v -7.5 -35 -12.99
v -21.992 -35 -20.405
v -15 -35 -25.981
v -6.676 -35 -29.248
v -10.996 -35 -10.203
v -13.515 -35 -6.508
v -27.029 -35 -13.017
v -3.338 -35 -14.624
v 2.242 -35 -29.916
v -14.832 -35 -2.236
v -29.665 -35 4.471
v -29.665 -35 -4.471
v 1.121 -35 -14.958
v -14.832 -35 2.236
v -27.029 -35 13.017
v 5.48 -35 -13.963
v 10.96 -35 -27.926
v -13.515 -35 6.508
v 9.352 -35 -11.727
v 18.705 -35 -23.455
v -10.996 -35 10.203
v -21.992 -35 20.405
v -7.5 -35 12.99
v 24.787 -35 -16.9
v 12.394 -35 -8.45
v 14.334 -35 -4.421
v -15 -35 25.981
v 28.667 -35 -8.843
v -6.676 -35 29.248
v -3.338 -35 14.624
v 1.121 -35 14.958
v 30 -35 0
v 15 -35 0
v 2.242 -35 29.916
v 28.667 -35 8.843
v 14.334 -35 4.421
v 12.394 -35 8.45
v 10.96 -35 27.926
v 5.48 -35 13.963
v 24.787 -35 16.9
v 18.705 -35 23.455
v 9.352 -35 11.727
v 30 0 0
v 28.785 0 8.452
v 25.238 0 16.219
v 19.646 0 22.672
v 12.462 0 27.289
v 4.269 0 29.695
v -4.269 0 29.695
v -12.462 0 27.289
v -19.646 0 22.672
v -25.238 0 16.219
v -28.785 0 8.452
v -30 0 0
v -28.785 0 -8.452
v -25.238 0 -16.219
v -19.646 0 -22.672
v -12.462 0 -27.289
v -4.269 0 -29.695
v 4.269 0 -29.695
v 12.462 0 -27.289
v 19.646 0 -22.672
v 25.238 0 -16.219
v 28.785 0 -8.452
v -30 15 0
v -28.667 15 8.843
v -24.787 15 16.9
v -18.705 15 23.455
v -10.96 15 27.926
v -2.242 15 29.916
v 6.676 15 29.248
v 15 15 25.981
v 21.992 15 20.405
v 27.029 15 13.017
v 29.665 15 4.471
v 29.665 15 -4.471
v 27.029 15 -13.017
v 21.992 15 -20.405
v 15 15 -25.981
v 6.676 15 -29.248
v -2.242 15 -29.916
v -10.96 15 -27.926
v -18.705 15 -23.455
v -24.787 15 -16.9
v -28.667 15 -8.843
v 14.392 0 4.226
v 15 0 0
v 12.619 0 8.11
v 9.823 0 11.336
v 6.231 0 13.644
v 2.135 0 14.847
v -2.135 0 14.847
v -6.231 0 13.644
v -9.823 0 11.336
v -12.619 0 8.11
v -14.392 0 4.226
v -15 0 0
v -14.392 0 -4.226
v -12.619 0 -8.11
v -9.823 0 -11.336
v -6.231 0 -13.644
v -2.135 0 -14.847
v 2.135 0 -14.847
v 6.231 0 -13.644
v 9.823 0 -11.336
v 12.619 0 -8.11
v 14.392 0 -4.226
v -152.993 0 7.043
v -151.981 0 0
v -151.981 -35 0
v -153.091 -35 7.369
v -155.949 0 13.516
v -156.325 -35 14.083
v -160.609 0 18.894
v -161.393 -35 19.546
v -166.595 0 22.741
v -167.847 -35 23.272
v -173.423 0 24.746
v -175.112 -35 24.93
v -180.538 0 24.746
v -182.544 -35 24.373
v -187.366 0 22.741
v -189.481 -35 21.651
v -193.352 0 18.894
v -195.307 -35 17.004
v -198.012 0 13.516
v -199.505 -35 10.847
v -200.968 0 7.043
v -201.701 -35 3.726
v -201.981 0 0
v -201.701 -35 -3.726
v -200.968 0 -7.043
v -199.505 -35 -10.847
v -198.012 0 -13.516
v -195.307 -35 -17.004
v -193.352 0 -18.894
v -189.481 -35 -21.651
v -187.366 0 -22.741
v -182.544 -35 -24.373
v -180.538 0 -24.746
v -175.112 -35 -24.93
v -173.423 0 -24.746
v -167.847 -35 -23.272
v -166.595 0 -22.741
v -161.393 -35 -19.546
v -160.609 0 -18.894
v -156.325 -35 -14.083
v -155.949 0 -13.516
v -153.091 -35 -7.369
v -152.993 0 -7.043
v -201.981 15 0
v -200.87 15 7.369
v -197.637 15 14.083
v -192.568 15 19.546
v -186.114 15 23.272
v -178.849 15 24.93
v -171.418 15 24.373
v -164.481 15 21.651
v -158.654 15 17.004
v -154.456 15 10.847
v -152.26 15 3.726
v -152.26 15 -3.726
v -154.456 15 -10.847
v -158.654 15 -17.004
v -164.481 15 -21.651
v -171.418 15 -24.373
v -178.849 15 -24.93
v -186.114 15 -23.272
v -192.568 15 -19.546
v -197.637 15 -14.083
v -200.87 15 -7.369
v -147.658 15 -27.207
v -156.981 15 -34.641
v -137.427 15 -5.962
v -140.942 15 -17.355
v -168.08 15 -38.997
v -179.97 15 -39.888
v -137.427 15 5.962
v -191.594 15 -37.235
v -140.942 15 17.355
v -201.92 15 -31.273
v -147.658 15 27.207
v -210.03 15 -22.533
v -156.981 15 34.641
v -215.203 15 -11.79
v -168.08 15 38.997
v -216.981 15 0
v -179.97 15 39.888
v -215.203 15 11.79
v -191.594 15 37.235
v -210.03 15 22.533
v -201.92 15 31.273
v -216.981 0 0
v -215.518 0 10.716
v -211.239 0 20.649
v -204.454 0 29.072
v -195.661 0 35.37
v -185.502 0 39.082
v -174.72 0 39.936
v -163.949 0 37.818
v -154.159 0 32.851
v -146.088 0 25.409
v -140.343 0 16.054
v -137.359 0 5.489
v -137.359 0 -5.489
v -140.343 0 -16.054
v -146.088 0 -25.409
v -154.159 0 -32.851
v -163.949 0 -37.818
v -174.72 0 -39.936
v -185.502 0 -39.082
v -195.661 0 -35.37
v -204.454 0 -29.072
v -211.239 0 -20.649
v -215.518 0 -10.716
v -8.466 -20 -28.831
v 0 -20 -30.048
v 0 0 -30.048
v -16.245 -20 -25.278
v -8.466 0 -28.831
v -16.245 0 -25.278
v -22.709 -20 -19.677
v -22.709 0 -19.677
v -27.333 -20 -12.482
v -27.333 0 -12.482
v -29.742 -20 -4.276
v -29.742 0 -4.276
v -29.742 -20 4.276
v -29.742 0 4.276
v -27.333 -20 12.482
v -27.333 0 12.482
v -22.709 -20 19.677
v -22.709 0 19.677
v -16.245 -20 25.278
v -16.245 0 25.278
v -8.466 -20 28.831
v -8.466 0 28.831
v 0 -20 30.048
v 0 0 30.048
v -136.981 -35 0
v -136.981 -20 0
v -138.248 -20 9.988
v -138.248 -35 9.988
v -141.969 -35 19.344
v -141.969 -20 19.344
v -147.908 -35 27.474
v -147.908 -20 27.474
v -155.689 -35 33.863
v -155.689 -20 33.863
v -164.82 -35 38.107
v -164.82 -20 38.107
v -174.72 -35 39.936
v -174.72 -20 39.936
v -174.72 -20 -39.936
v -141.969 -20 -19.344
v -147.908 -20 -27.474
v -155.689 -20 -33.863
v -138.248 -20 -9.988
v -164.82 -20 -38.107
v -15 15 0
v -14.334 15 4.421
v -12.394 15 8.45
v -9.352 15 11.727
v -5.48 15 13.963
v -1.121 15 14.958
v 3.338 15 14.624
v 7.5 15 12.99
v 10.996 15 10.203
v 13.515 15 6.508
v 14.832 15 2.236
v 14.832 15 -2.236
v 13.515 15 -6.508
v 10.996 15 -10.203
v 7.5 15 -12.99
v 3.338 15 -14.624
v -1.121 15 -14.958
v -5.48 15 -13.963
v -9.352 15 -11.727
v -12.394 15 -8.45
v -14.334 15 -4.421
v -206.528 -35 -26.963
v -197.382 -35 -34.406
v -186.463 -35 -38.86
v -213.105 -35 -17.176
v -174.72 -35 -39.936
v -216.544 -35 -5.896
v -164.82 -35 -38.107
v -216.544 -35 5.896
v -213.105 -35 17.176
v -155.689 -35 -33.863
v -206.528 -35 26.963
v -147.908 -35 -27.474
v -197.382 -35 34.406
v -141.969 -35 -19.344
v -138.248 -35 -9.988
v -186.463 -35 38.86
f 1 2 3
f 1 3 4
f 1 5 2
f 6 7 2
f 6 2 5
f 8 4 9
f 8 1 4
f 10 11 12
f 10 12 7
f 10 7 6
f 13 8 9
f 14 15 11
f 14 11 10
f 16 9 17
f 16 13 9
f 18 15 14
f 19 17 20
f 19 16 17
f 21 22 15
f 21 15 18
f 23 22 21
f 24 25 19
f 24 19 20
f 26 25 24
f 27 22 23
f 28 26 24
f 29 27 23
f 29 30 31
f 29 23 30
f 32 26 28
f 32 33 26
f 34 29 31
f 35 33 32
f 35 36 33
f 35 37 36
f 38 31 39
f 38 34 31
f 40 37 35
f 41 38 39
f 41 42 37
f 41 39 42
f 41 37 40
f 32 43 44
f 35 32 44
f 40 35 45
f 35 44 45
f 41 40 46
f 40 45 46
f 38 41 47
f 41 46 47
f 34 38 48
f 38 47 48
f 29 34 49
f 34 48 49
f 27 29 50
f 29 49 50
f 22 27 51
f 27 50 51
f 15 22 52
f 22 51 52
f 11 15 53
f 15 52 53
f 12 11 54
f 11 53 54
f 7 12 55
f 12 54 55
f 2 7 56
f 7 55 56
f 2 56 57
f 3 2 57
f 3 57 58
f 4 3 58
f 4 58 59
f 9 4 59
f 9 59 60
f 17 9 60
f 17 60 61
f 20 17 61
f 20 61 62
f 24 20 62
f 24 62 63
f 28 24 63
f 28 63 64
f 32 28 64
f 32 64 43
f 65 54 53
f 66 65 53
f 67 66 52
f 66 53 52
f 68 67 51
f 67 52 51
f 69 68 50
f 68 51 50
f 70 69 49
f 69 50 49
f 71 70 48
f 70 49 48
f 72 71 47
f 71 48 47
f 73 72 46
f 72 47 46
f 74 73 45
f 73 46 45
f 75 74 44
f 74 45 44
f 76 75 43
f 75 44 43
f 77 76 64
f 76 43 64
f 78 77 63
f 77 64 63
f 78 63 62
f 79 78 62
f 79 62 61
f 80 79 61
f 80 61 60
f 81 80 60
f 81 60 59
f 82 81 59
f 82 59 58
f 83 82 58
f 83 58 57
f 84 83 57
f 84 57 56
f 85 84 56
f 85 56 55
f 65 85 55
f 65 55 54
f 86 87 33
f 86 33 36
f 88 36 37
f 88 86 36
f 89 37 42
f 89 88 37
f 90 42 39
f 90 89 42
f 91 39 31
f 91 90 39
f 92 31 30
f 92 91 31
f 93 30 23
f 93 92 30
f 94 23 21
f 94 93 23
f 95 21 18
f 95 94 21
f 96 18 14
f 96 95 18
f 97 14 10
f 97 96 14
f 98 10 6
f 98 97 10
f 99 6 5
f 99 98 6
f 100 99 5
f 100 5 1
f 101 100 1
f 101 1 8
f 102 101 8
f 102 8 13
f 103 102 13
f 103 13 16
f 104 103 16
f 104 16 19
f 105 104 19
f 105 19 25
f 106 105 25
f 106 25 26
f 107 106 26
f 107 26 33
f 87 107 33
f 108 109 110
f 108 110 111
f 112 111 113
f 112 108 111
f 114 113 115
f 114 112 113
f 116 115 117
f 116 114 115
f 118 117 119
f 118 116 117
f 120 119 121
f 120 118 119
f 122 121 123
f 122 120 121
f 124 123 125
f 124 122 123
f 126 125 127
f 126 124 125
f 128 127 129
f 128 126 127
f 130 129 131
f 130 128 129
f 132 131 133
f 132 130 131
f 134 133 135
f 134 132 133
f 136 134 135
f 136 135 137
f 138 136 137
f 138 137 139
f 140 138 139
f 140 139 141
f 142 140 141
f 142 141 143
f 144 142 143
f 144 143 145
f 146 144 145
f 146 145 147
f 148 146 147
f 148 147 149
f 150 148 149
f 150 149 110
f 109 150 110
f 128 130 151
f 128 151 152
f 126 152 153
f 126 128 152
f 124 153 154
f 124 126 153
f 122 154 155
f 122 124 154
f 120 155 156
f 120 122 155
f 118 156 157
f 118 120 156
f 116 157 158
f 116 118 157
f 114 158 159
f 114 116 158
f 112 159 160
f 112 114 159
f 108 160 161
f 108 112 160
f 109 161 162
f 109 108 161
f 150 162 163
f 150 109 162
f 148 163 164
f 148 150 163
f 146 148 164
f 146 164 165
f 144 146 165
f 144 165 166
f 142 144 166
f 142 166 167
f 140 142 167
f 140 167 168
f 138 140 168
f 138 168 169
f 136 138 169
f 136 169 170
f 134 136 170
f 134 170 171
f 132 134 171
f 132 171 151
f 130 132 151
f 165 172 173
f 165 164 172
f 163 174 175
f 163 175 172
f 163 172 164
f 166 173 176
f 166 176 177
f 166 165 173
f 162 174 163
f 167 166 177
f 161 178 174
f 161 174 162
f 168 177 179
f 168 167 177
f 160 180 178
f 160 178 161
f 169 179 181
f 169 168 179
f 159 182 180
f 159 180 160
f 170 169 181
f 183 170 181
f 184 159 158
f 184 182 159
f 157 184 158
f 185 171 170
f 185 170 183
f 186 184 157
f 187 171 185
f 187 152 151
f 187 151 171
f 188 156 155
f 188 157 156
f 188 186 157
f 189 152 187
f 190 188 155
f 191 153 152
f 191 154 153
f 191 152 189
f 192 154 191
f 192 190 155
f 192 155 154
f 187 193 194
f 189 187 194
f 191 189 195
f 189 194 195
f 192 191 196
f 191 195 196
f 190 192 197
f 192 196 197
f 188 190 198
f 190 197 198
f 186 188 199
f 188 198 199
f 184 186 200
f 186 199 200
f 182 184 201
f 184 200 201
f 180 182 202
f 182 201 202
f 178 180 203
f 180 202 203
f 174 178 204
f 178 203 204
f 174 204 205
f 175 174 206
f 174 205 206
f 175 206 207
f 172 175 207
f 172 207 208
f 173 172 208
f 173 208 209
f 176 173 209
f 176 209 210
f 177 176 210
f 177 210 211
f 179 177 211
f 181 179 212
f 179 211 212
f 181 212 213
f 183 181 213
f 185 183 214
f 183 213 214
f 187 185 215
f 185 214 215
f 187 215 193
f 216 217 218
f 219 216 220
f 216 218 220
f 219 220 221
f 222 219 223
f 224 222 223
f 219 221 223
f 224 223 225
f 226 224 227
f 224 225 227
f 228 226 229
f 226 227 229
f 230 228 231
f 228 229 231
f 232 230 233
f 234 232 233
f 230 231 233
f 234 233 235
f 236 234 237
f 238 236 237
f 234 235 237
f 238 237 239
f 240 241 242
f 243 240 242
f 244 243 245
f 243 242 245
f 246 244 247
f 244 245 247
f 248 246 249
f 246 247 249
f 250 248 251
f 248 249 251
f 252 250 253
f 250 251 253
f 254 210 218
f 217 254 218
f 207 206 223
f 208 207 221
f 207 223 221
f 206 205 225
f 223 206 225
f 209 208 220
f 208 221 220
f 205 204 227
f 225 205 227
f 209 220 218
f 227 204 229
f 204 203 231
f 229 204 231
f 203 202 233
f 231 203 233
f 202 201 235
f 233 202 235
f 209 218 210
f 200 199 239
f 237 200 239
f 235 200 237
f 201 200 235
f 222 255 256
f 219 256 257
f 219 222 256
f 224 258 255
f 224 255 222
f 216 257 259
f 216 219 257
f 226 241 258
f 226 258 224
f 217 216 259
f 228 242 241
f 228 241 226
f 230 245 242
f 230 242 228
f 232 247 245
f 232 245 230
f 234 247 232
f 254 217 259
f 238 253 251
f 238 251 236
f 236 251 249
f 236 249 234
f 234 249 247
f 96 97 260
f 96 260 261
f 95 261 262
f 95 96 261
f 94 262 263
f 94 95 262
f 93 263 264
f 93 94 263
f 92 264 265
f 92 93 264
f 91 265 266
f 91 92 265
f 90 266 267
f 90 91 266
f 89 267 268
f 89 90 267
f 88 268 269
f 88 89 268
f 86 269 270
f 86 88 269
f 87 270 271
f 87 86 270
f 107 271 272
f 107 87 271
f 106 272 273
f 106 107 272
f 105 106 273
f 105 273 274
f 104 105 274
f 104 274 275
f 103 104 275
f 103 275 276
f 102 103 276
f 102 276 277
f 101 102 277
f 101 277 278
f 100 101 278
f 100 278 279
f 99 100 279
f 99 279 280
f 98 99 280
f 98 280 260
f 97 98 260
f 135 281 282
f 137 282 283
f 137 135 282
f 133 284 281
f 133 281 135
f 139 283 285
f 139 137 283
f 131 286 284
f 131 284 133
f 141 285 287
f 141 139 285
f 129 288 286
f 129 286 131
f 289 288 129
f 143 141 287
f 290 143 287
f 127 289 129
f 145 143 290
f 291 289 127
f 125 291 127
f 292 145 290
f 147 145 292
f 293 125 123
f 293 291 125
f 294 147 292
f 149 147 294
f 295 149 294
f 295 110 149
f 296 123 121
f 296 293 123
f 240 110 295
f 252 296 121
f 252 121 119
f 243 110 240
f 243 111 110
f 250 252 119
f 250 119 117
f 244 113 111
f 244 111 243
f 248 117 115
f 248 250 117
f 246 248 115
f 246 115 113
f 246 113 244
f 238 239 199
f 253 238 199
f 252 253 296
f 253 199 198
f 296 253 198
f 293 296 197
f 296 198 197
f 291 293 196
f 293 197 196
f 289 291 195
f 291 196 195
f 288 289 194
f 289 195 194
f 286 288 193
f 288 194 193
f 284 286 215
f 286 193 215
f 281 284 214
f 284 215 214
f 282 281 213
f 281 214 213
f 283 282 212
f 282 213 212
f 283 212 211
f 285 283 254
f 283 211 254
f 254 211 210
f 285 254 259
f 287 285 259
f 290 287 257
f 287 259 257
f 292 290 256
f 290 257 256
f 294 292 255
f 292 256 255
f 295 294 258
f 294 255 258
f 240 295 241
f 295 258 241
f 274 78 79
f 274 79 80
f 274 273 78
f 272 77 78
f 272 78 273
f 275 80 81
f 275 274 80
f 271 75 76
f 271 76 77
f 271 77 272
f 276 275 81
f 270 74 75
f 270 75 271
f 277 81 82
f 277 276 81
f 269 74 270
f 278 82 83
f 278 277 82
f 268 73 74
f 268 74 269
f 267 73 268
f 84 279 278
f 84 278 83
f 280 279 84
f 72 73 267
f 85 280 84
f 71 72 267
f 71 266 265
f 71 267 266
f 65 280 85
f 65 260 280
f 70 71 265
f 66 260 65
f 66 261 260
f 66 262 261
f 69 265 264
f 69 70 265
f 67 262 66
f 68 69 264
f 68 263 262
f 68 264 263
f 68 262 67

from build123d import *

# Parameters (mm, degrees)
F1_DEPTH = 20
F0_R     = 25
F0_R_2   = 30
F0_R_3   = 15
F2_DEPTH = 35
F3_R     = 30
F3_R_2   = 15
F4_DEPTH = 15
F5_R     = 40
F5_R_2   = 25
F6_DEPTH = 15


with BuildPart() as f1:
    # F0 (on Front) → F1 (new body)
    with BuildSketch(Plane.XZ):
        with BuildLine():
            ThreePointArc((-174.720421, 39.936096), (-147.908186, 27.473574), (-136.980557, 0))
            ThreePointArc((-136.980557, 0), (-147.908186, -27.473574), (-174.720421, -39.936096))
            Line((-174.720421, -39.936096), (0, -30.048004))
            ThreePointArc((0, -30.048004), (-30.048004, 0), (0, 30.048004))
            Line((0, 30.048004), (-174.720421, 39.936096))
        make_face()
    extrude(amount=F1_DEPTH)

    # F0 (on Front) → F2 (join)
    with BuildSketch(Plane.XZ):
        with BuildLine():
            ThreePointArc((-174.720421, -39.936096), (-147.908186, -27.473574), (-136.980557, 0))
            ThreePointArc((-136.980557, 0), (-147.908186, 27.473574), (-174.720421, 39.936096))
            ThreePointArc((-174.720421, 39.936096), (-216.980557, 0), (-174.720421, -39.936096))
        make_face()
        with Locations((-176.980557, 0)):
            Circle(F0_R, mode=Mode.SUBTRACT)
        Circle(F0_R_2)
        Circle(F0_R_3, mode=Mode.SUBTRACT)
    extrude(amount=F2_DEPTH)

    # F3 (on face) → F4 (join)
    with BuildSketch(Plane(origin=(0, 0, 0), x_dir=(-1, 0, 0), z_dir=(0, 1, 0))):
        Circle(F3_R)
        Circle(F3_R_2, mode=Mode.SUBTRACT)
    extrude(amount=F4_DEPTH)

    # F5 (on face) → F6 (join)
    with BuildSketch(Plane(origin=(0, 0, 0), x_dir=(-1, 0, 0), z_dir=(0, 1, 0))):
        with Locations((176.980557, 0)):
            Circle(F5_R)
        with Locations((176.980557, 0)):
            Circle(F5_R_2, mode=Mode.SUBTRACT)
    extrude(amount=F6_DEPTH)


solid = f1.part
